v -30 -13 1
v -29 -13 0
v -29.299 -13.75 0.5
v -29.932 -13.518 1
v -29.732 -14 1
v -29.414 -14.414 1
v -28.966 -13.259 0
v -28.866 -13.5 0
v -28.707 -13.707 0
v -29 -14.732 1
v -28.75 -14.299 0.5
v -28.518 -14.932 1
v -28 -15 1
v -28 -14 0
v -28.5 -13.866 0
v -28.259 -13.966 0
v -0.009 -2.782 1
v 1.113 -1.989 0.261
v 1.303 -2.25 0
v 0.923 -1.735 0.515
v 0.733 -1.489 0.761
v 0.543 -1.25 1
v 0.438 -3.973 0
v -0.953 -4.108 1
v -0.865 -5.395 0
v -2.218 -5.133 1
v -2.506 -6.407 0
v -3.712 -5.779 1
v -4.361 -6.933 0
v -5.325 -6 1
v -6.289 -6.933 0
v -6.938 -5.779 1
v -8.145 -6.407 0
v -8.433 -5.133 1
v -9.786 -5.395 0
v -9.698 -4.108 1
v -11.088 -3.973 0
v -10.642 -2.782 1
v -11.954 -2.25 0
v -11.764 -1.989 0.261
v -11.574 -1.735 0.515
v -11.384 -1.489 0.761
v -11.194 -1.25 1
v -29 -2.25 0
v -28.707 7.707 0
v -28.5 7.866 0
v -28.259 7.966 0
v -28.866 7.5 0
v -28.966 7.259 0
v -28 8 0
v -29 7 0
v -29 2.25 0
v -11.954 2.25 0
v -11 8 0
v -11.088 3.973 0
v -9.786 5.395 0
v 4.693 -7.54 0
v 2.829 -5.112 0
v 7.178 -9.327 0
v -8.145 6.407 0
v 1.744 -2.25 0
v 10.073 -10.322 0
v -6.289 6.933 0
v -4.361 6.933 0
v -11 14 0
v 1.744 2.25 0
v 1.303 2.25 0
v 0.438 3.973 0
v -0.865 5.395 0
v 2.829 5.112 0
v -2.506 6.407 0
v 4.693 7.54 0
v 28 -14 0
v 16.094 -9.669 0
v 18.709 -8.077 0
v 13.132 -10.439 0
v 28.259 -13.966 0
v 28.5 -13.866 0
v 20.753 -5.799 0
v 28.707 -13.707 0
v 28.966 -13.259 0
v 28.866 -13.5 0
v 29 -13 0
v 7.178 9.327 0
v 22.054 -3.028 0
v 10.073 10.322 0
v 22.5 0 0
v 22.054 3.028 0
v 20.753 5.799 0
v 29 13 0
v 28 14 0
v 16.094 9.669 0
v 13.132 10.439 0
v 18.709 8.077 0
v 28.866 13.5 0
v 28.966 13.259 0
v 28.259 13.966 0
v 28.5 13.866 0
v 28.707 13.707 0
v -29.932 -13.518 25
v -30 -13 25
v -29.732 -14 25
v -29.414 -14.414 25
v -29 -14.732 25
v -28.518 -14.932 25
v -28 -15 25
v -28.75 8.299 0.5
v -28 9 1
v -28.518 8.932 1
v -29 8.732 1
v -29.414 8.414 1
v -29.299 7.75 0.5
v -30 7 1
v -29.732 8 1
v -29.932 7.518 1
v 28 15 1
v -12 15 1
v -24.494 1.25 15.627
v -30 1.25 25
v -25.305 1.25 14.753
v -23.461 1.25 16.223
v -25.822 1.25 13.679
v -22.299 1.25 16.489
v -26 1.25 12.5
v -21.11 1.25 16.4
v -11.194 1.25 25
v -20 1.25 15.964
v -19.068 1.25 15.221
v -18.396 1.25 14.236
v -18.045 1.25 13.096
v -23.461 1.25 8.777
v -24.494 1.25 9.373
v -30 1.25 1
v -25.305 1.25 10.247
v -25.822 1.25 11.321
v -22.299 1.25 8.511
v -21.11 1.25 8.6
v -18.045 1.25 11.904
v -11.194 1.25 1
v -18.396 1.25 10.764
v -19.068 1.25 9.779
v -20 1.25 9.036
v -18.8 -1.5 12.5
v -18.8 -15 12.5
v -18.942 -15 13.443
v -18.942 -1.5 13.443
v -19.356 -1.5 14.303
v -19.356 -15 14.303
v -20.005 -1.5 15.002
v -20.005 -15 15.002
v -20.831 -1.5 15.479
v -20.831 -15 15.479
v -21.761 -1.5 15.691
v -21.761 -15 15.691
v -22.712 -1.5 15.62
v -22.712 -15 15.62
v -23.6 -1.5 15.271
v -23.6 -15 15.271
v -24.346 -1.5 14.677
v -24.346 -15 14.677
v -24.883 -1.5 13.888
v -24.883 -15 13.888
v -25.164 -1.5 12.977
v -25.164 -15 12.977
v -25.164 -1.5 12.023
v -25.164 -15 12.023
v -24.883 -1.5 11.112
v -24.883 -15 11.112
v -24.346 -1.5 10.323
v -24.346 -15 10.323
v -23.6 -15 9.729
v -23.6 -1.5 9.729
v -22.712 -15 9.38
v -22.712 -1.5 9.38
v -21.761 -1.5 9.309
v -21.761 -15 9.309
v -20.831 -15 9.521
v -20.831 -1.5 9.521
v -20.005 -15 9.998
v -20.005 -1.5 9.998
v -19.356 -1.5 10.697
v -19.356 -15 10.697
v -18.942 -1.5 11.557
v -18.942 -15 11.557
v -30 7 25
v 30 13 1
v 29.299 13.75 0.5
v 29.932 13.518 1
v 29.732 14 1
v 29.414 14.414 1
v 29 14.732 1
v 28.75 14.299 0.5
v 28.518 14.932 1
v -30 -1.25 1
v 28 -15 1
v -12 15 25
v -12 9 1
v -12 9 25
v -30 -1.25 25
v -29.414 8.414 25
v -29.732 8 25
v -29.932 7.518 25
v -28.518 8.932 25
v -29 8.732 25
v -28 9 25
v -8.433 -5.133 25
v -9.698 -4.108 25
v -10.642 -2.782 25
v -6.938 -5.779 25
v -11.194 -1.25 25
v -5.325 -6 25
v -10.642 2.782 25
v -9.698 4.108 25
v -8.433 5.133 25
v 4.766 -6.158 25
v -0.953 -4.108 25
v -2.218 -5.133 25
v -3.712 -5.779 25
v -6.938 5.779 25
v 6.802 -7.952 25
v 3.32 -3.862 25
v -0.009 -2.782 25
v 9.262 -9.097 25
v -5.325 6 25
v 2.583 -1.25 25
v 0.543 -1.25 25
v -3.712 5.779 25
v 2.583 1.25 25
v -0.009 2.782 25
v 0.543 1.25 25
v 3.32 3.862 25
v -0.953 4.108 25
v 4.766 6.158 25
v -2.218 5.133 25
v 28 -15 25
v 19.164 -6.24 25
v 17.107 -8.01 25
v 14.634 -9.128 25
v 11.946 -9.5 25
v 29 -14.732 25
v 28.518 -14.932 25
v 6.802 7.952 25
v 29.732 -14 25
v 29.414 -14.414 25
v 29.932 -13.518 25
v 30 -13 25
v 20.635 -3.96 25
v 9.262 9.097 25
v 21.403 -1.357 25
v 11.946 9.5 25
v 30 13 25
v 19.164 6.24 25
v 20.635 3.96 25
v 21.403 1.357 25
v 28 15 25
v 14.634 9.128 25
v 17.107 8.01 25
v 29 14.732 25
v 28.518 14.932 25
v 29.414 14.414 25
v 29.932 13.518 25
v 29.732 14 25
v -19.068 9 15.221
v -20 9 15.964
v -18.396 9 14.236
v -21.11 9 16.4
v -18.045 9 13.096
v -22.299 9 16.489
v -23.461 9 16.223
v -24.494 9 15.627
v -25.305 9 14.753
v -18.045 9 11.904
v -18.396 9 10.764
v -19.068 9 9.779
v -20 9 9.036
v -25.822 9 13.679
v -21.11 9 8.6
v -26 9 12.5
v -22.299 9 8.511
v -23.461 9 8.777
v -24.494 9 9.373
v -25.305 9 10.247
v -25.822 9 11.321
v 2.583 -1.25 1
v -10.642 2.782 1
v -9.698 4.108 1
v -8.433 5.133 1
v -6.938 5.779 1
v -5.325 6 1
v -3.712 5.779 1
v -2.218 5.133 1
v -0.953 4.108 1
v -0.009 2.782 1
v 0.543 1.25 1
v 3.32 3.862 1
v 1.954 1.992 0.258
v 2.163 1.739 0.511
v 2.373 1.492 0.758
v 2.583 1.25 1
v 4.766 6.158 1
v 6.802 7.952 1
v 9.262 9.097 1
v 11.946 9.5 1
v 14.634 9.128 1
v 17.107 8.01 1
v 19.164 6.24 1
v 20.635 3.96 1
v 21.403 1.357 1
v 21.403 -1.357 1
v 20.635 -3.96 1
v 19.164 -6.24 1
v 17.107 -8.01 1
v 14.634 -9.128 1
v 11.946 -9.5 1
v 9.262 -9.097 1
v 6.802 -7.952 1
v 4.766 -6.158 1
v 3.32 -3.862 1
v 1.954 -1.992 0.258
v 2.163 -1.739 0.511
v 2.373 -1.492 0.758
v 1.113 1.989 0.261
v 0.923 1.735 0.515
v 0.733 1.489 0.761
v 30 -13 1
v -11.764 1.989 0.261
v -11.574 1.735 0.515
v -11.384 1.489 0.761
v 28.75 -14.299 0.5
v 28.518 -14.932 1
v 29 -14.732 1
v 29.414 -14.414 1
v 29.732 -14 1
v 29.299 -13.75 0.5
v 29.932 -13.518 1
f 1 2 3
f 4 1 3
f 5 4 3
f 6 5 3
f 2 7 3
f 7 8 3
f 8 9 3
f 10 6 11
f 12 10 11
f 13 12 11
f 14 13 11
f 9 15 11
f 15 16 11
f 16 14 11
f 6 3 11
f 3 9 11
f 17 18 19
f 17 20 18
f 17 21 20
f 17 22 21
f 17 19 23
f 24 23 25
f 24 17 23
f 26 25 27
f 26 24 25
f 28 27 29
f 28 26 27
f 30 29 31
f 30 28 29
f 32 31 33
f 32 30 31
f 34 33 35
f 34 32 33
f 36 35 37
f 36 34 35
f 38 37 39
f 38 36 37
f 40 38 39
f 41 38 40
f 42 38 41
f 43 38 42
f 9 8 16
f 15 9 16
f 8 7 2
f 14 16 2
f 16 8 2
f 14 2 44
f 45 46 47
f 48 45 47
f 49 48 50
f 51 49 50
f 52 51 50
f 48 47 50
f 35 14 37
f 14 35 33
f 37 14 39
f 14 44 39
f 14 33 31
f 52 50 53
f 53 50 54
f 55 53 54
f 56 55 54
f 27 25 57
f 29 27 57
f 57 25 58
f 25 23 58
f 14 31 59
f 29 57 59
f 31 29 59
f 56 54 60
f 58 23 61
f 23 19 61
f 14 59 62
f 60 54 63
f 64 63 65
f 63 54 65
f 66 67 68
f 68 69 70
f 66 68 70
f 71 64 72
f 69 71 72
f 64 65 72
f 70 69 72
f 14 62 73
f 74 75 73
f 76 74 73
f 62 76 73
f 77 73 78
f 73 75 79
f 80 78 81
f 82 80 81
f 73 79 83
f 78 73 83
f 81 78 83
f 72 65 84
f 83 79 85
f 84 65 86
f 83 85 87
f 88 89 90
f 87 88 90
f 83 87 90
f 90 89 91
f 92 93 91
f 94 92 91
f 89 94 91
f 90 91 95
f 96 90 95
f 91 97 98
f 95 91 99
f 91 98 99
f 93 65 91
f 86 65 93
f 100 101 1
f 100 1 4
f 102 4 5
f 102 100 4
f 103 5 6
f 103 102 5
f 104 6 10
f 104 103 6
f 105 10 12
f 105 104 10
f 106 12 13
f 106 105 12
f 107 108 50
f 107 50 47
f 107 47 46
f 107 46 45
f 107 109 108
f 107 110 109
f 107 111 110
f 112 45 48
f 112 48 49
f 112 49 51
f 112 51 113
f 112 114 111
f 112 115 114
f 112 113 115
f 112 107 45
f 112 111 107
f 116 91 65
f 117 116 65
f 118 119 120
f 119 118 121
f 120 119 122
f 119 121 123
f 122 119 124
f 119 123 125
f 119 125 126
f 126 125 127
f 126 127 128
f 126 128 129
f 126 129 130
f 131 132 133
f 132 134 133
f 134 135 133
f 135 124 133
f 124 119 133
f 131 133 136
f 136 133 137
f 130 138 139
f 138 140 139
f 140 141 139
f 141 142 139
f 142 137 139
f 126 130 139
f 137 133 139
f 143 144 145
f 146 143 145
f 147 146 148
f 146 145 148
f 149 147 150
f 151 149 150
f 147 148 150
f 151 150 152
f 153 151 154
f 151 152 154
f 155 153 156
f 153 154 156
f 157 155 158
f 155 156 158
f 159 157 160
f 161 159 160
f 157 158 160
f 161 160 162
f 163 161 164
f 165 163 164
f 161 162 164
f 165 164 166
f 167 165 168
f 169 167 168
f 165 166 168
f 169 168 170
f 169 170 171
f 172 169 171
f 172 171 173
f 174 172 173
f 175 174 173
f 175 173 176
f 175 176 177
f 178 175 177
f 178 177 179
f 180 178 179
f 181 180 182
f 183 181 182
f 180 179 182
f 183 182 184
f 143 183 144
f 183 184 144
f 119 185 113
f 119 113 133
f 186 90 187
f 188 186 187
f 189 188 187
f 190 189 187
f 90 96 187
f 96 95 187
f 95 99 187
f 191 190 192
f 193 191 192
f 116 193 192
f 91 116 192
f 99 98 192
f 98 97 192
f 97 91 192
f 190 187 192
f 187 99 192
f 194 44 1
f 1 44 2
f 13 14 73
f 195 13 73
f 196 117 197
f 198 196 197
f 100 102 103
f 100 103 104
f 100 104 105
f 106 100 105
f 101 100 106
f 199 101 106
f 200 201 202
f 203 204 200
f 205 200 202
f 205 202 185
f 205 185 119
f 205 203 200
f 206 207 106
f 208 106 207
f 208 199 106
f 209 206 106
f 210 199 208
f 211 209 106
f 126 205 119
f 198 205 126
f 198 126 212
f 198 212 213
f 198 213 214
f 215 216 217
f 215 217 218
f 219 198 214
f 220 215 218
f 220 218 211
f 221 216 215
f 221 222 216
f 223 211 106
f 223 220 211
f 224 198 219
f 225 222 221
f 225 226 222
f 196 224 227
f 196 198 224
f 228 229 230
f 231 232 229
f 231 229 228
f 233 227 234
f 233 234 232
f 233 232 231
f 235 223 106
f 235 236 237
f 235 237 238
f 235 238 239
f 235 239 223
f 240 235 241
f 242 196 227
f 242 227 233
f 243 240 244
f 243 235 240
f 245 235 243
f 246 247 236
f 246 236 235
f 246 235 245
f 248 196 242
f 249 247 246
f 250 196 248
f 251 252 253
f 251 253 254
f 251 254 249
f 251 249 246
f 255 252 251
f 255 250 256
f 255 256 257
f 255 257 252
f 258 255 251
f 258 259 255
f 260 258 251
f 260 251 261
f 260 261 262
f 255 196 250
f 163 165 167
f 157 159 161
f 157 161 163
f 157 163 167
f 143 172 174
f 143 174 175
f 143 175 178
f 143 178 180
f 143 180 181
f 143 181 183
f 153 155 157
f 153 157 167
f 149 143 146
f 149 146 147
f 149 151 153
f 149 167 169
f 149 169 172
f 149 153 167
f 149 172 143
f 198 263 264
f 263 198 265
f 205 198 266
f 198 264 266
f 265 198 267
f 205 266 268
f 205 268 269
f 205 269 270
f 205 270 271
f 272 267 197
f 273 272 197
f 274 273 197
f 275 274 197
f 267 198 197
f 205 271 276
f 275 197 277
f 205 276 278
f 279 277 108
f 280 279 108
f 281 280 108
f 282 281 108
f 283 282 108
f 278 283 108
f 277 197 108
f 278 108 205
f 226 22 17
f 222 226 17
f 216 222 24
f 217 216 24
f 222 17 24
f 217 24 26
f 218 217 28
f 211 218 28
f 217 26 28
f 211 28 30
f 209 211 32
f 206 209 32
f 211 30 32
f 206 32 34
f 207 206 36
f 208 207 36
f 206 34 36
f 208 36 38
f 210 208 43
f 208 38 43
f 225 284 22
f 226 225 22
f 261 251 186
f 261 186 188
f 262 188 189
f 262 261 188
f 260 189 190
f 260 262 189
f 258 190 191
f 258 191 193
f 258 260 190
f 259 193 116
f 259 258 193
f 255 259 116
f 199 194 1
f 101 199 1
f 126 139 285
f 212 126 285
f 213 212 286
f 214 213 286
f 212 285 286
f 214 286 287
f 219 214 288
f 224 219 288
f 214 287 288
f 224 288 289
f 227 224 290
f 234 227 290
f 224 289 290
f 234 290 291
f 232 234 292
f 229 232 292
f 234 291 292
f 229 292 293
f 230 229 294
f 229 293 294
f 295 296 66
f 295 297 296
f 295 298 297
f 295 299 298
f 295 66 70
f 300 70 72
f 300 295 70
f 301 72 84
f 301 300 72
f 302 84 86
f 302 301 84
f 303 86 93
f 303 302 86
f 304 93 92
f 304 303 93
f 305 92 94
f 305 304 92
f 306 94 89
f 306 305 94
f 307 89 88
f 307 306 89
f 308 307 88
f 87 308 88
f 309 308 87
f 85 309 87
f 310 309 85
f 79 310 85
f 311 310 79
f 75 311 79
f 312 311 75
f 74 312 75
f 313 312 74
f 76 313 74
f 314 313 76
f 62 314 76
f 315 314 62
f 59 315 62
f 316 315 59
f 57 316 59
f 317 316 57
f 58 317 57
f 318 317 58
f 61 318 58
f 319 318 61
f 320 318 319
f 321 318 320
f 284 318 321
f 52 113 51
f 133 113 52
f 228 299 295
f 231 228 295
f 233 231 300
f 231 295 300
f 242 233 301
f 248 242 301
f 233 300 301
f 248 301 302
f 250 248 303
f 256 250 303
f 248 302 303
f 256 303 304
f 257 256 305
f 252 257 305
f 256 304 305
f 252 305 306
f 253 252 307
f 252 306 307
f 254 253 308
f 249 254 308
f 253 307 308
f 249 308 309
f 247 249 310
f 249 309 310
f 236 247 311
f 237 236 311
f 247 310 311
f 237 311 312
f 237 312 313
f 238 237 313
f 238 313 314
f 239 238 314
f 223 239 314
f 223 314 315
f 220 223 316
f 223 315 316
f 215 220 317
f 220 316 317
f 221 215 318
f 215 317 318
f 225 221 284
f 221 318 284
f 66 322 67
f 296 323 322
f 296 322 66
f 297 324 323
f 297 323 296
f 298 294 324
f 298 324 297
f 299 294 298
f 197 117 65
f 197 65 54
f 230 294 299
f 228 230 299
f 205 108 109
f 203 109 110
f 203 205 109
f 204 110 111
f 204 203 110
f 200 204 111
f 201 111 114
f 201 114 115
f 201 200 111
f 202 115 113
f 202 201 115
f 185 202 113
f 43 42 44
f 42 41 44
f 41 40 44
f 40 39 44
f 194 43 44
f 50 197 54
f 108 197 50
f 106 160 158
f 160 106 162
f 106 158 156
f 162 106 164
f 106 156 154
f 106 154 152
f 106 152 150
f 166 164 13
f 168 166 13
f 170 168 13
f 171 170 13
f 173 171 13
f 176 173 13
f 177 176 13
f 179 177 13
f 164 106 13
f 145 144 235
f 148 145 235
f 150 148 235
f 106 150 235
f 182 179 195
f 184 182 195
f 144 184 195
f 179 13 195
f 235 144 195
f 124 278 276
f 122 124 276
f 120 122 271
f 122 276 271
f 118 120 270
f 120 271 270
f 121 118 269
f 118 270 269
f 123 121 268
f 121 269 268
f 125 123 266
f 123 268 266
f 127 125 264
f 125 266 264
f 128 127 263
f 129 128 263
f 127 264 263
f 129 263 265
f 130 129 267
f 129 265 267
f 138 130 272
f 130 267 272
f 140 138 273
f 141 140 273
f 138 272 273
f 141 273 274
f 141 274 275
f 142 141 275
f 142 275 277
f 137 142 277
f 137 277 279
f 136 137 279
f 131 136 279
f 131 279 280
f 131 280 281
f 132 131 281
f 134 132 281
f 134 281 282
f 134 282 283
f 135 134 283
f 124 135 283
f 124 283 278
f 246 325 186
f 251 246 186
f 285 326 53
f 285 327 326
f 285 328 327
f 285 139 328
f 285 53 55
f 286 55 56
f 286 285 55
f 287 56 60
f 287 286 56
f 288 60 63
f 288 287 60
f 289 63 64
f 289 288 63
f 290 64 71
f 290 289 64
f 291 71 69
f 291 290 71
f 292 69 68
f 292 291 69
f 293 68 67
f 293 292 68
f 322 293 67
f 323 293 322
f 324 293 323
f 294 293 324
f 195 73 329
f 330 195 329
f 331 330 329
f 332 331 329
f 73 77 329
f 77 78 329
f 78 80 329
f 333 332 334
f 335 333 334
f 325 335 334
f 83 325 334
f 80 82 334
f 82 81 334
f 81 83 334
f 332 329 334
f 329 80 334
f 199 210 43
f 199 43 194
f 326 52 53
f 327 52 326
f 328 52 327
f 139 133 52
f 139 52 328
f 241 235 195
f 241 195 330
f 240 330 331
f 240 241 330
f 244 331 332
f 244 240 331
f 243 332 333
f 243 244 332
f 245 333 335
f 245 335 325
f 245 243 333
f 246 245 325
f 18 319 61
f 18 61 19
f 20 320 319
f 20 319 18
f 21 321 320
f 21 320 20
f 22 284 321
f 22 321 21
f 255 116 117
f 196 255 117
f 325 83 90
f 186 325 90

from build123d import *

# Parameters (mm, degrees)
F1_DEPTH = 15
F2_DEPTH = 25
F3_DEPTH = 25
F4_R     = 4
F5_DEPTH = 9
F6_R     = 3.2
F7_DEPTH = 13.5
F8_R     = 2
F9_SIZE  = 1


# Not quite as in the source:
# - a feature names something its author has since deleted; it is built from what else it names


with BuildPart() as f1:
    # F0 (on Top) → F1 (new body)
    with BuildSketch(Plane.XY):
        with BuildLine():
            Line((-30, -1.25), (-30, -15))
            Line((-30, -15), (30, -15))
            Line((30, -15), (30, 15))
            Line((30, 15), (-12, 15))
            Line((-12, 15), (-12, 9))
            Line((-12, 9), (-30, 9))
            Line((-30, 9), (-30, 1.25))
            Line((-30, 1.25), (-11.1936553667, 1.25))
            ThreePointArc((-11.1936553667, 1.25), (-5.3253080696, 6), (0.5430392276, 1.25))
            Line((0.5430392276, 1.25), (2.5825958991, 1.25))
            ThreePointArc((2.5825958991, 1.25), (21.5, 0), (2.5825958991, -1.25))
            Line((2.5825958991, -1.25), (0.5430392276, -1.25))
            ThreePointArc((0.5430392276, -1.25), (-5.3253080696, -6), (-11.1936553667, -1.25))
            Line((-11.1936553667, -1.25), (-30, -1.25))
        make_face()
    extrude(amount=F1_DEPTH)

    # F0 (on Top) + F1_face (on face) → F2 (join)
    with BuildSketch(Plane.XY):
        with BuildLine():
            Line((-30, -1.25), (-30, -15))
            Line((-30, -15), (30, -15))
            Line((30, -15), (30, 15))
            Line((30, 15), (-12, 15))
            Line((-12, 15), (-12, 9))
            Line((-12, 9), (-30, 9))
            Line((-30, 9), (-30, 1.25))
            Line((-30, 1.25), (-11.1936553667, 1.25))
            ThreePointArc((-11.1936553667, 1.25), (-5.3253080696, 6), (0.5430392276, 1.25))
            Line((0.5430392276, 1.25), (2.5825958991, 1.25))
            ThreePointArc((2.5825958991, 1.25), (21.5, 0), (2.5825958991, -1.25))
            Line((2.5825958991, -1.25), (0.5430392276, -1.25))
            ThreePointArc((0.5430392276, -1.25), (-5.3253080696, -6), (-11.1936553667, -1.25))
            Line((-11.1936553667, -1.25), (-30, -1.25))
        make_face()
    with BuildSketch(Plane(origin=(0.3427711831, -1.0419373609, 0), x_dir=(1, 0, 0), z_dir=(0, 0, -1))):
        with BuildLine():
            ThreePointArc((2.239824716, 0.2080626391), (21.1572288169, -1.0419373609), (2.239824716, -2.2919373609))
            Line((2.239824716, -2.2919373609), (0.2002680445, -2.2919373609))
            ThreePointArc((0.2002680445, -2.2919373609), (-5.6680792527, -7.0419373609), (-11.5364265498, -2.2919373609))
            Line((-11.5364265498, -2.2919373609), (-30.3427711831, -2.2919373609))
            Line((-30.3427711831, -2.2919373609), (-30.3427711831, -10.0419373609))
            Line((-30.3427711831, -10.0419373609), (-12.3427711831, -10.0419373609))
            Line((-12.3427711831, -10.0419373609), (-12.3427711831, -16.0419373609))
            Line((-12.3427711831, -16.0419373609), (29.6572288169, -16.0419373609))
            Line((29.6572288169, -16.0419373609), (29.6572288169, 13.9580626391))
            Line((29.6572288169, 13.9580626391), (-30.3427711831, 13.9580626391))
            Line((-30.3427711831, 13.9580626391), (-30.3427711831, 0.2080626391))
            Line((-30.3427711831, 0.2080626391), (-11.5364265498, 0.2080626391))
            ThreePointArc((-11.5364265498, 0.2080626391), (-5.6680792527, 4.9580626391), (0.2002680445, 0.2080626391))
            Line((0.2002680445, 0.2080626391), (2.239824716, 0.2080626391))
        make_face()
    extrude(amount=F2_DEPTH, dir=(0, 0, 1))

    # F0 (on Top) → F3 (join)
    with BuildSketch(Plane.XY):
        with BuildLine():
            Line((-30, -1.25), (-30, -15))
            Line((-30, -15), (30, -15))
            Line((30, -15), (30, 15))
            Line((30, 15), (-12, 15))
            Line((-12, 15), (-12, 9))
            Line((-12, 9), (-30, 9))
            Line((-30, 9), (-30, 1.25))
            Line((-30, 1.25), (-11.1936553667, 1.25))
            ThreePointArc((-11.1936553667, 1.25), (-5.3253080696, 6), (0.5430392276, 1.25))
            Line((0.5430392276, 1.25), (2.5825958991, 1.25))
            ThreePointArc((2.5825958991, 1.25), (21.5, 0), (2.5825958991, -1.25))
            Line((2.5825958991, -1.25), (0.5430392276, -1.25))
            ThreePointArc((0.5430392276, -1.25), (-5.3253080696, -6), (-11.1936553667, -1.25))
            Line((-11.1936553667, -1.25), (-30, -1.25))
        make_face()
    extrude(amount=F3_DEPTH)

    # F4 (on face) → F5 (cut)
    with BuildSketch(Plane(origin=(0, 9, 0), x_dir=(-1, 0, 0), z_dir=(0, 1, 0))):
        with Locations((22, 12.5)):
            Circle(F4_R)
    extrude(amount=-F5_DEPTH, mode=Mode.SUBTRACT)

    # F6 (on face) → F7 (cut)
    with BuildSketch(Plane.XZ.offset(15)):
        with Locations((-22, 12.5)):
            Circle(F6_R)
    extrude(amount=-F7_DEPTH, mode=Mode.SUBTRACT)

    # F8
    f8_edges = [f1.edges().sort_by_distance(p)[0] for p in [
        (30, -15, 12.5),
        (30, 15, 12.5),
        (-30, -15, 12.5),
        (-30, 9, 12.5),
    ]]
    fillet(f8_edges, radius=F8_R)

    # F9
    f9_edges = [f1.edges().sort_by_distance(p)[0] for p in [
        (-30, -7.125, 0),
        (-29.414214, -14.414214, 0),
        (-20.596828, -1.25, 0),
        (0, -15, 0),
        (-5.325308, -6, 0),
        (29.414214, -14.414214, 0),
        (1.562818, -1.25, 0),
        (30, 0, 0),
        (21.5, 0, 0),
        (29.414214, 14.414214, 0),
        (1.562818, 1.25, 0),
        (8, 15, 0),
        (-5.325308, 6, 0),
        (-12, 12, 0),
        (-20.596828, 1.25, 0),
        (-20, 9, 0),
        (-30, 4.125, 0),
        (-29.414214, 8.414214, 0),
    ]]
    chamfer(f9_edges, length=F9_SIZE)


solid = f1.part
